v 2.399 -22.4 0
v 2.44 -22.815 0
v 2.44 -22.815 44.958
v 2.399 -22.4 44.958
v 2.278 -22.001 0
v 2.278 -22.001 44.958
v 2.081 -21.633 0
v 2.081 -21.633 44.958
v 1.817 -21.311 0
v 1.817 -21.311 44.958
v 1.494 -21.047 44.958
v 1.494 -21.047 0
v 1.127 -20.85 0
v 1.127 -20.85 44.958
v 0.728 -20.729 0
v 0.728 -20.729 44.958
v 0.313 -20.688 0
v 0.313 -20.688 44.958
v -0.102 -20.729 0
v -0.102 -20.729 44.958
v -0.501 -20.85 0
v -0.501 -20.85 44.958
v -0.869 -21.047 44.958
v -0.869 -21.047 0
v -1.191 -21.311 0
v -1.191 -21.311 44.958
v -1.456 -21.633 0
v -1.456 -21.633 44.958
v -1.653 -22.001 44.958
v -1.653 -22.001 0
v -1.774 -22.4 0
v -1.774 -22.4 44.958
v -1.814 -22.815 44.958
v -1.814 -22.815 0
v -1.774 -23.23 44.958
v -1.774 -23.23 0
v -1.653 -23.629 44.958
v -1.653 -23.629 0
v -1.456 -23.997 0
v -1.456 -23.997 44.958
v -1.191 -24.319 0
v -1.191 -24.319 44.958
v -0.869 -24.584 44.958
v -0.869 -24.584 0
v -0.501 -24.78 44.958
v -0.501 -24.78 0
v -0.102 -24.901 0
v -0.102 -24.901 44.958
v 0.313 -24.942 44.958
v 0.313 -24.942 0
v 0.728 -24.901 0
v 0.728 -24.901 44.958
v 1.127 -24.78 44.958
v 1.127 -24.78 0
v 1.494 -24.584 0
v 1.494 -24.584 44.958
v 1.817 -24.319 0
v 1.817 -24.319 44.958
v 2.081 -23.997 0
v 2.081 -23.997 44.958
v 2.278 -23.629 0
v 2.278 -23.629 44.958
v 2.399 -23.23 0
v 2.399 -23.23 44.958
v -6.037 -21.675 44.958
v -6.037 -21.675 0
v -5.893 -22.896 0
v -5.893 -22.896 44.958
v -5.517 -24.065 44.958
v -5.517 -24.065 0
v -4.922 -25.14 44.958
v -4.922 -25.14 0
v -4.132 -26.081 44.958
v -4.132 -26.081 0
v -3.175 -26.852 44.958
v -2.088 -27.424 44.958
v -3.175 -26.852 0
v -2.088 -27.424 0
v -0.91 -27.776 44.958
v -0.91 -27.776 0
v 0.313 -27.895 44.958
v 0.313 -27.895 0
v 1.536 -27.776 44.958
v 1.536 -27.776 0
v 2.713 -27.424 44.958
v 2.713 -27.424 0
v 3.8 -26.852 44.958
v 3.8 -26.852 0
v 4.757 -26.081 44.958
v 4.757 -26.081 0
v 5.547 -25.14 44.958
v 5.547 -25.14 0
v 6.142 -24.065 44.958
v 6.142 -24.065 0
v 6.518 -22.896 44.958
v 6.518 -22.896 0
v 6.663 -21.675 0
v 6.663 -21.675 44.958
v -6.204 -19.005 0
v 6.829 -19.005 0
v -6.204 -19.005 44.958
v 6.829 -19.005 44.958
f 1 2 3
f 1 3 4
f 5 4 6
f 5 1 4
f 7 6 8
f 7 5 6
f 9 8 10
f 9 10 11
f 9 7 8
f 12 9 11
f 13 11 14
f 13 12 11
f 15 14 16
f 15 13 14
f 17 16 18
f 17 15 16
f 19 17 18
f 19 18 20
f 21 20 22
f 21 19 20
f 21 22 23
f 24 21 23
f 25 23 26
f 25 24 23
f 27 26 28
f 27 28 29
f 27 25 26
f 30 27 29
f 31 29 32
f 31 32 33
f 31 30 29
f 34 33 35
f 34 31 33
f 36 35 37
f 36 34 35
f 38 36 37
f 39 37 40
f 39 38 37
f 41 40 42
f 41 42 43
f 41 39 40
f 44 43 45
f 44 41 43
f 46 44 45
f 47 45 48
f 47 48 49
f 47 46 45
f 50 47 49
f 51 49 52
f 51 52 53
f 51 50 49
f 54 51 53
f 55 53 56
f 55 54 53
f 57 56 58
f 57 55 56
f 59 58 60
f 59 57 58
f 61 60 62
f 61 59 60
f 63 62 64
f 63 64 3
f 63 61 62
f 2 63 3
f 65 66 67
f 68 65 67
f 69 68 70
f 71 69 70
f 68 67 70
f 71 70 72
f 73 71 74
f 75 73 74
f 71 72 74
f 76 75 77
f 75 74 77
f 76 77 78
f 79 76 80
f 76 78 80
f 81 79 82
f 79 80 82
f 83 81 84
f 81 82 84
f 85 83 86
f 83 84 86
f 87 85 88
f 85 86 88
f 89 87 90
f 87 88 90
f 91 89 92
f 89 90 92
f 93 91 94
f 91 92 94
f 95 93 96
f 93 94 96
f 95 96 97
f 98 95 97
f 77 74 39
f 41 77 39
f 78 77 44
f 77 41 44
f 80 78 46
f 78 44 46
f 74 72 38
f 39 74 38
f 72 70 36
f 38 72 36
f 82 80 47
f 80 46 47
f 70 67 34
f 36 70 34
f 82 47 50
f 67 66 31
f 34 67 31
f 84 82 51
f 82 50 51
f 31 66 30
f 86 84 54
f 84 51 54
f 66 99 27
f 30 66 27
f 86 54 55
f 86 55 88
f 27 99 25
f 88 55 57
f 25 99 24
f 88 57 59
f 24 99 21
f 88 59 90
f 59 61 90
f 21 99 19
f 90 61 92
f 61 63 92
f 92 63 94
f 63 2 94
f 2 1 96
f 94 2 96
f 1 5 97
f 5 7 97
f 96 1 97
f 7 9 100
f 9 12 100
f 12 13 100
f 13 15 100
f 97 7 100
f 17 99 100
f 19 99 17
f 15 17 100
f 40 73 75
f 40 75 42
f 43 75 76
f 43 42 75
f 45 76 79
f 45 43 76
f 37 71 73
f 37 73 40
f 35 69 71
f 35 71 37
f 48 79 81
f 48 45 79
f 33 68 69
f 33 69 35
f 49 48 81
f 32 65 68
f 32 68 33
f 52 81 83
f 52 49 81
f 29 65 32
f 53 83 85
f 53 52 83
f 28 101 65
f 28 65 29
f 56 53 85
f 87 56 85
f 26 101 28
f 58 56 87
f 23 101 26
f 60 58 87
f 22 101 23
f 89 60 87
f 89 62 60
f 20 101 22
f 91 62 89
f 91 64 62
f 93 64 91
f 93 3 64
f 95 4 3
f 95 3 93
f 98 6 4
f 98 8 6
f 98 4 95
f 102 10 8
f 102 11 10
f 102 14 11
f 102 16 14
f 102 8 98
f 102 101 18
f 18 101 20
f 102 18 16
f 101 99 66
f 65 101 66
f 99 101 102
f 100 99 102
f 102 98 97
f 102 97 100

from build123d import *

# Parameters (mm, degrees)
SKETCH1_R           = 2.127
SKETCH1_R_2         = 2.032
BOSS_EXTRUDE1_DEPTH = 44.958
SKETCH2_W           = 61.162711876
SKETCH2_H           = 56.657422832
CUT_EXTRUDE1_DEPTH  = 57.200072865


with BuildPart() as part:
    # Sketch1 → Boss-Extrude1 (new body)
    with BuildSketch(Plane.XY):
        with BuildLine():
            Line((6.662551774, -21.675328207), (9.781210426, 28.223210221))
            ThreePointArc((9.781210426, 28.223210221), (8.75546188, 31.069569496), (5.978630102, 32.270871491))
            Line((5.978630102, 32.270871491), (-5.353526553, 32.270871491))
            ThreePointArc((-5.353526553, 32.270871491), (-8.130358331, 31.069569496), (-9.156106877, 28.223210221))
            Line((-9.156106877, 28.223210221), (-6.037448226, -21.675328207))
            ThreePointArc((-6.037448226, -21.675328207), (0.312551774, -27.895146648), (6.662551774, -21.675328207))
        make_face()
        with Locations((0.312551774, -22.815146648)):
            Circle(SKETCH1_R, mode=Mode.SUBTRACT)
        with Locations((0.312551774, 0.044853352)):
            Circle(SKETCH1_R, mode=Mode.SUBTRACT)
        with Locations((0.312551774, 22.110871491)):
            Circle(SKETCH1_R_2, mode=Mode.SUBTRACT)
    extrude(amount=BOSS_EXTRUDE1_DEPTH)

    # Sketch2 → Cut-Extrude1 (cut, through all)
    with BuildSketch(Plane.XY.offset(44.958)):
        with Locations((2.830749484, 9.323564768)):
            Rectangle(SKETCH2_W, SKETCH2_H)
    extrude(amount=-CUT_EXTRUDE1_DEPTH, mode=Mode.SUBTRACT)


solid = part.part
